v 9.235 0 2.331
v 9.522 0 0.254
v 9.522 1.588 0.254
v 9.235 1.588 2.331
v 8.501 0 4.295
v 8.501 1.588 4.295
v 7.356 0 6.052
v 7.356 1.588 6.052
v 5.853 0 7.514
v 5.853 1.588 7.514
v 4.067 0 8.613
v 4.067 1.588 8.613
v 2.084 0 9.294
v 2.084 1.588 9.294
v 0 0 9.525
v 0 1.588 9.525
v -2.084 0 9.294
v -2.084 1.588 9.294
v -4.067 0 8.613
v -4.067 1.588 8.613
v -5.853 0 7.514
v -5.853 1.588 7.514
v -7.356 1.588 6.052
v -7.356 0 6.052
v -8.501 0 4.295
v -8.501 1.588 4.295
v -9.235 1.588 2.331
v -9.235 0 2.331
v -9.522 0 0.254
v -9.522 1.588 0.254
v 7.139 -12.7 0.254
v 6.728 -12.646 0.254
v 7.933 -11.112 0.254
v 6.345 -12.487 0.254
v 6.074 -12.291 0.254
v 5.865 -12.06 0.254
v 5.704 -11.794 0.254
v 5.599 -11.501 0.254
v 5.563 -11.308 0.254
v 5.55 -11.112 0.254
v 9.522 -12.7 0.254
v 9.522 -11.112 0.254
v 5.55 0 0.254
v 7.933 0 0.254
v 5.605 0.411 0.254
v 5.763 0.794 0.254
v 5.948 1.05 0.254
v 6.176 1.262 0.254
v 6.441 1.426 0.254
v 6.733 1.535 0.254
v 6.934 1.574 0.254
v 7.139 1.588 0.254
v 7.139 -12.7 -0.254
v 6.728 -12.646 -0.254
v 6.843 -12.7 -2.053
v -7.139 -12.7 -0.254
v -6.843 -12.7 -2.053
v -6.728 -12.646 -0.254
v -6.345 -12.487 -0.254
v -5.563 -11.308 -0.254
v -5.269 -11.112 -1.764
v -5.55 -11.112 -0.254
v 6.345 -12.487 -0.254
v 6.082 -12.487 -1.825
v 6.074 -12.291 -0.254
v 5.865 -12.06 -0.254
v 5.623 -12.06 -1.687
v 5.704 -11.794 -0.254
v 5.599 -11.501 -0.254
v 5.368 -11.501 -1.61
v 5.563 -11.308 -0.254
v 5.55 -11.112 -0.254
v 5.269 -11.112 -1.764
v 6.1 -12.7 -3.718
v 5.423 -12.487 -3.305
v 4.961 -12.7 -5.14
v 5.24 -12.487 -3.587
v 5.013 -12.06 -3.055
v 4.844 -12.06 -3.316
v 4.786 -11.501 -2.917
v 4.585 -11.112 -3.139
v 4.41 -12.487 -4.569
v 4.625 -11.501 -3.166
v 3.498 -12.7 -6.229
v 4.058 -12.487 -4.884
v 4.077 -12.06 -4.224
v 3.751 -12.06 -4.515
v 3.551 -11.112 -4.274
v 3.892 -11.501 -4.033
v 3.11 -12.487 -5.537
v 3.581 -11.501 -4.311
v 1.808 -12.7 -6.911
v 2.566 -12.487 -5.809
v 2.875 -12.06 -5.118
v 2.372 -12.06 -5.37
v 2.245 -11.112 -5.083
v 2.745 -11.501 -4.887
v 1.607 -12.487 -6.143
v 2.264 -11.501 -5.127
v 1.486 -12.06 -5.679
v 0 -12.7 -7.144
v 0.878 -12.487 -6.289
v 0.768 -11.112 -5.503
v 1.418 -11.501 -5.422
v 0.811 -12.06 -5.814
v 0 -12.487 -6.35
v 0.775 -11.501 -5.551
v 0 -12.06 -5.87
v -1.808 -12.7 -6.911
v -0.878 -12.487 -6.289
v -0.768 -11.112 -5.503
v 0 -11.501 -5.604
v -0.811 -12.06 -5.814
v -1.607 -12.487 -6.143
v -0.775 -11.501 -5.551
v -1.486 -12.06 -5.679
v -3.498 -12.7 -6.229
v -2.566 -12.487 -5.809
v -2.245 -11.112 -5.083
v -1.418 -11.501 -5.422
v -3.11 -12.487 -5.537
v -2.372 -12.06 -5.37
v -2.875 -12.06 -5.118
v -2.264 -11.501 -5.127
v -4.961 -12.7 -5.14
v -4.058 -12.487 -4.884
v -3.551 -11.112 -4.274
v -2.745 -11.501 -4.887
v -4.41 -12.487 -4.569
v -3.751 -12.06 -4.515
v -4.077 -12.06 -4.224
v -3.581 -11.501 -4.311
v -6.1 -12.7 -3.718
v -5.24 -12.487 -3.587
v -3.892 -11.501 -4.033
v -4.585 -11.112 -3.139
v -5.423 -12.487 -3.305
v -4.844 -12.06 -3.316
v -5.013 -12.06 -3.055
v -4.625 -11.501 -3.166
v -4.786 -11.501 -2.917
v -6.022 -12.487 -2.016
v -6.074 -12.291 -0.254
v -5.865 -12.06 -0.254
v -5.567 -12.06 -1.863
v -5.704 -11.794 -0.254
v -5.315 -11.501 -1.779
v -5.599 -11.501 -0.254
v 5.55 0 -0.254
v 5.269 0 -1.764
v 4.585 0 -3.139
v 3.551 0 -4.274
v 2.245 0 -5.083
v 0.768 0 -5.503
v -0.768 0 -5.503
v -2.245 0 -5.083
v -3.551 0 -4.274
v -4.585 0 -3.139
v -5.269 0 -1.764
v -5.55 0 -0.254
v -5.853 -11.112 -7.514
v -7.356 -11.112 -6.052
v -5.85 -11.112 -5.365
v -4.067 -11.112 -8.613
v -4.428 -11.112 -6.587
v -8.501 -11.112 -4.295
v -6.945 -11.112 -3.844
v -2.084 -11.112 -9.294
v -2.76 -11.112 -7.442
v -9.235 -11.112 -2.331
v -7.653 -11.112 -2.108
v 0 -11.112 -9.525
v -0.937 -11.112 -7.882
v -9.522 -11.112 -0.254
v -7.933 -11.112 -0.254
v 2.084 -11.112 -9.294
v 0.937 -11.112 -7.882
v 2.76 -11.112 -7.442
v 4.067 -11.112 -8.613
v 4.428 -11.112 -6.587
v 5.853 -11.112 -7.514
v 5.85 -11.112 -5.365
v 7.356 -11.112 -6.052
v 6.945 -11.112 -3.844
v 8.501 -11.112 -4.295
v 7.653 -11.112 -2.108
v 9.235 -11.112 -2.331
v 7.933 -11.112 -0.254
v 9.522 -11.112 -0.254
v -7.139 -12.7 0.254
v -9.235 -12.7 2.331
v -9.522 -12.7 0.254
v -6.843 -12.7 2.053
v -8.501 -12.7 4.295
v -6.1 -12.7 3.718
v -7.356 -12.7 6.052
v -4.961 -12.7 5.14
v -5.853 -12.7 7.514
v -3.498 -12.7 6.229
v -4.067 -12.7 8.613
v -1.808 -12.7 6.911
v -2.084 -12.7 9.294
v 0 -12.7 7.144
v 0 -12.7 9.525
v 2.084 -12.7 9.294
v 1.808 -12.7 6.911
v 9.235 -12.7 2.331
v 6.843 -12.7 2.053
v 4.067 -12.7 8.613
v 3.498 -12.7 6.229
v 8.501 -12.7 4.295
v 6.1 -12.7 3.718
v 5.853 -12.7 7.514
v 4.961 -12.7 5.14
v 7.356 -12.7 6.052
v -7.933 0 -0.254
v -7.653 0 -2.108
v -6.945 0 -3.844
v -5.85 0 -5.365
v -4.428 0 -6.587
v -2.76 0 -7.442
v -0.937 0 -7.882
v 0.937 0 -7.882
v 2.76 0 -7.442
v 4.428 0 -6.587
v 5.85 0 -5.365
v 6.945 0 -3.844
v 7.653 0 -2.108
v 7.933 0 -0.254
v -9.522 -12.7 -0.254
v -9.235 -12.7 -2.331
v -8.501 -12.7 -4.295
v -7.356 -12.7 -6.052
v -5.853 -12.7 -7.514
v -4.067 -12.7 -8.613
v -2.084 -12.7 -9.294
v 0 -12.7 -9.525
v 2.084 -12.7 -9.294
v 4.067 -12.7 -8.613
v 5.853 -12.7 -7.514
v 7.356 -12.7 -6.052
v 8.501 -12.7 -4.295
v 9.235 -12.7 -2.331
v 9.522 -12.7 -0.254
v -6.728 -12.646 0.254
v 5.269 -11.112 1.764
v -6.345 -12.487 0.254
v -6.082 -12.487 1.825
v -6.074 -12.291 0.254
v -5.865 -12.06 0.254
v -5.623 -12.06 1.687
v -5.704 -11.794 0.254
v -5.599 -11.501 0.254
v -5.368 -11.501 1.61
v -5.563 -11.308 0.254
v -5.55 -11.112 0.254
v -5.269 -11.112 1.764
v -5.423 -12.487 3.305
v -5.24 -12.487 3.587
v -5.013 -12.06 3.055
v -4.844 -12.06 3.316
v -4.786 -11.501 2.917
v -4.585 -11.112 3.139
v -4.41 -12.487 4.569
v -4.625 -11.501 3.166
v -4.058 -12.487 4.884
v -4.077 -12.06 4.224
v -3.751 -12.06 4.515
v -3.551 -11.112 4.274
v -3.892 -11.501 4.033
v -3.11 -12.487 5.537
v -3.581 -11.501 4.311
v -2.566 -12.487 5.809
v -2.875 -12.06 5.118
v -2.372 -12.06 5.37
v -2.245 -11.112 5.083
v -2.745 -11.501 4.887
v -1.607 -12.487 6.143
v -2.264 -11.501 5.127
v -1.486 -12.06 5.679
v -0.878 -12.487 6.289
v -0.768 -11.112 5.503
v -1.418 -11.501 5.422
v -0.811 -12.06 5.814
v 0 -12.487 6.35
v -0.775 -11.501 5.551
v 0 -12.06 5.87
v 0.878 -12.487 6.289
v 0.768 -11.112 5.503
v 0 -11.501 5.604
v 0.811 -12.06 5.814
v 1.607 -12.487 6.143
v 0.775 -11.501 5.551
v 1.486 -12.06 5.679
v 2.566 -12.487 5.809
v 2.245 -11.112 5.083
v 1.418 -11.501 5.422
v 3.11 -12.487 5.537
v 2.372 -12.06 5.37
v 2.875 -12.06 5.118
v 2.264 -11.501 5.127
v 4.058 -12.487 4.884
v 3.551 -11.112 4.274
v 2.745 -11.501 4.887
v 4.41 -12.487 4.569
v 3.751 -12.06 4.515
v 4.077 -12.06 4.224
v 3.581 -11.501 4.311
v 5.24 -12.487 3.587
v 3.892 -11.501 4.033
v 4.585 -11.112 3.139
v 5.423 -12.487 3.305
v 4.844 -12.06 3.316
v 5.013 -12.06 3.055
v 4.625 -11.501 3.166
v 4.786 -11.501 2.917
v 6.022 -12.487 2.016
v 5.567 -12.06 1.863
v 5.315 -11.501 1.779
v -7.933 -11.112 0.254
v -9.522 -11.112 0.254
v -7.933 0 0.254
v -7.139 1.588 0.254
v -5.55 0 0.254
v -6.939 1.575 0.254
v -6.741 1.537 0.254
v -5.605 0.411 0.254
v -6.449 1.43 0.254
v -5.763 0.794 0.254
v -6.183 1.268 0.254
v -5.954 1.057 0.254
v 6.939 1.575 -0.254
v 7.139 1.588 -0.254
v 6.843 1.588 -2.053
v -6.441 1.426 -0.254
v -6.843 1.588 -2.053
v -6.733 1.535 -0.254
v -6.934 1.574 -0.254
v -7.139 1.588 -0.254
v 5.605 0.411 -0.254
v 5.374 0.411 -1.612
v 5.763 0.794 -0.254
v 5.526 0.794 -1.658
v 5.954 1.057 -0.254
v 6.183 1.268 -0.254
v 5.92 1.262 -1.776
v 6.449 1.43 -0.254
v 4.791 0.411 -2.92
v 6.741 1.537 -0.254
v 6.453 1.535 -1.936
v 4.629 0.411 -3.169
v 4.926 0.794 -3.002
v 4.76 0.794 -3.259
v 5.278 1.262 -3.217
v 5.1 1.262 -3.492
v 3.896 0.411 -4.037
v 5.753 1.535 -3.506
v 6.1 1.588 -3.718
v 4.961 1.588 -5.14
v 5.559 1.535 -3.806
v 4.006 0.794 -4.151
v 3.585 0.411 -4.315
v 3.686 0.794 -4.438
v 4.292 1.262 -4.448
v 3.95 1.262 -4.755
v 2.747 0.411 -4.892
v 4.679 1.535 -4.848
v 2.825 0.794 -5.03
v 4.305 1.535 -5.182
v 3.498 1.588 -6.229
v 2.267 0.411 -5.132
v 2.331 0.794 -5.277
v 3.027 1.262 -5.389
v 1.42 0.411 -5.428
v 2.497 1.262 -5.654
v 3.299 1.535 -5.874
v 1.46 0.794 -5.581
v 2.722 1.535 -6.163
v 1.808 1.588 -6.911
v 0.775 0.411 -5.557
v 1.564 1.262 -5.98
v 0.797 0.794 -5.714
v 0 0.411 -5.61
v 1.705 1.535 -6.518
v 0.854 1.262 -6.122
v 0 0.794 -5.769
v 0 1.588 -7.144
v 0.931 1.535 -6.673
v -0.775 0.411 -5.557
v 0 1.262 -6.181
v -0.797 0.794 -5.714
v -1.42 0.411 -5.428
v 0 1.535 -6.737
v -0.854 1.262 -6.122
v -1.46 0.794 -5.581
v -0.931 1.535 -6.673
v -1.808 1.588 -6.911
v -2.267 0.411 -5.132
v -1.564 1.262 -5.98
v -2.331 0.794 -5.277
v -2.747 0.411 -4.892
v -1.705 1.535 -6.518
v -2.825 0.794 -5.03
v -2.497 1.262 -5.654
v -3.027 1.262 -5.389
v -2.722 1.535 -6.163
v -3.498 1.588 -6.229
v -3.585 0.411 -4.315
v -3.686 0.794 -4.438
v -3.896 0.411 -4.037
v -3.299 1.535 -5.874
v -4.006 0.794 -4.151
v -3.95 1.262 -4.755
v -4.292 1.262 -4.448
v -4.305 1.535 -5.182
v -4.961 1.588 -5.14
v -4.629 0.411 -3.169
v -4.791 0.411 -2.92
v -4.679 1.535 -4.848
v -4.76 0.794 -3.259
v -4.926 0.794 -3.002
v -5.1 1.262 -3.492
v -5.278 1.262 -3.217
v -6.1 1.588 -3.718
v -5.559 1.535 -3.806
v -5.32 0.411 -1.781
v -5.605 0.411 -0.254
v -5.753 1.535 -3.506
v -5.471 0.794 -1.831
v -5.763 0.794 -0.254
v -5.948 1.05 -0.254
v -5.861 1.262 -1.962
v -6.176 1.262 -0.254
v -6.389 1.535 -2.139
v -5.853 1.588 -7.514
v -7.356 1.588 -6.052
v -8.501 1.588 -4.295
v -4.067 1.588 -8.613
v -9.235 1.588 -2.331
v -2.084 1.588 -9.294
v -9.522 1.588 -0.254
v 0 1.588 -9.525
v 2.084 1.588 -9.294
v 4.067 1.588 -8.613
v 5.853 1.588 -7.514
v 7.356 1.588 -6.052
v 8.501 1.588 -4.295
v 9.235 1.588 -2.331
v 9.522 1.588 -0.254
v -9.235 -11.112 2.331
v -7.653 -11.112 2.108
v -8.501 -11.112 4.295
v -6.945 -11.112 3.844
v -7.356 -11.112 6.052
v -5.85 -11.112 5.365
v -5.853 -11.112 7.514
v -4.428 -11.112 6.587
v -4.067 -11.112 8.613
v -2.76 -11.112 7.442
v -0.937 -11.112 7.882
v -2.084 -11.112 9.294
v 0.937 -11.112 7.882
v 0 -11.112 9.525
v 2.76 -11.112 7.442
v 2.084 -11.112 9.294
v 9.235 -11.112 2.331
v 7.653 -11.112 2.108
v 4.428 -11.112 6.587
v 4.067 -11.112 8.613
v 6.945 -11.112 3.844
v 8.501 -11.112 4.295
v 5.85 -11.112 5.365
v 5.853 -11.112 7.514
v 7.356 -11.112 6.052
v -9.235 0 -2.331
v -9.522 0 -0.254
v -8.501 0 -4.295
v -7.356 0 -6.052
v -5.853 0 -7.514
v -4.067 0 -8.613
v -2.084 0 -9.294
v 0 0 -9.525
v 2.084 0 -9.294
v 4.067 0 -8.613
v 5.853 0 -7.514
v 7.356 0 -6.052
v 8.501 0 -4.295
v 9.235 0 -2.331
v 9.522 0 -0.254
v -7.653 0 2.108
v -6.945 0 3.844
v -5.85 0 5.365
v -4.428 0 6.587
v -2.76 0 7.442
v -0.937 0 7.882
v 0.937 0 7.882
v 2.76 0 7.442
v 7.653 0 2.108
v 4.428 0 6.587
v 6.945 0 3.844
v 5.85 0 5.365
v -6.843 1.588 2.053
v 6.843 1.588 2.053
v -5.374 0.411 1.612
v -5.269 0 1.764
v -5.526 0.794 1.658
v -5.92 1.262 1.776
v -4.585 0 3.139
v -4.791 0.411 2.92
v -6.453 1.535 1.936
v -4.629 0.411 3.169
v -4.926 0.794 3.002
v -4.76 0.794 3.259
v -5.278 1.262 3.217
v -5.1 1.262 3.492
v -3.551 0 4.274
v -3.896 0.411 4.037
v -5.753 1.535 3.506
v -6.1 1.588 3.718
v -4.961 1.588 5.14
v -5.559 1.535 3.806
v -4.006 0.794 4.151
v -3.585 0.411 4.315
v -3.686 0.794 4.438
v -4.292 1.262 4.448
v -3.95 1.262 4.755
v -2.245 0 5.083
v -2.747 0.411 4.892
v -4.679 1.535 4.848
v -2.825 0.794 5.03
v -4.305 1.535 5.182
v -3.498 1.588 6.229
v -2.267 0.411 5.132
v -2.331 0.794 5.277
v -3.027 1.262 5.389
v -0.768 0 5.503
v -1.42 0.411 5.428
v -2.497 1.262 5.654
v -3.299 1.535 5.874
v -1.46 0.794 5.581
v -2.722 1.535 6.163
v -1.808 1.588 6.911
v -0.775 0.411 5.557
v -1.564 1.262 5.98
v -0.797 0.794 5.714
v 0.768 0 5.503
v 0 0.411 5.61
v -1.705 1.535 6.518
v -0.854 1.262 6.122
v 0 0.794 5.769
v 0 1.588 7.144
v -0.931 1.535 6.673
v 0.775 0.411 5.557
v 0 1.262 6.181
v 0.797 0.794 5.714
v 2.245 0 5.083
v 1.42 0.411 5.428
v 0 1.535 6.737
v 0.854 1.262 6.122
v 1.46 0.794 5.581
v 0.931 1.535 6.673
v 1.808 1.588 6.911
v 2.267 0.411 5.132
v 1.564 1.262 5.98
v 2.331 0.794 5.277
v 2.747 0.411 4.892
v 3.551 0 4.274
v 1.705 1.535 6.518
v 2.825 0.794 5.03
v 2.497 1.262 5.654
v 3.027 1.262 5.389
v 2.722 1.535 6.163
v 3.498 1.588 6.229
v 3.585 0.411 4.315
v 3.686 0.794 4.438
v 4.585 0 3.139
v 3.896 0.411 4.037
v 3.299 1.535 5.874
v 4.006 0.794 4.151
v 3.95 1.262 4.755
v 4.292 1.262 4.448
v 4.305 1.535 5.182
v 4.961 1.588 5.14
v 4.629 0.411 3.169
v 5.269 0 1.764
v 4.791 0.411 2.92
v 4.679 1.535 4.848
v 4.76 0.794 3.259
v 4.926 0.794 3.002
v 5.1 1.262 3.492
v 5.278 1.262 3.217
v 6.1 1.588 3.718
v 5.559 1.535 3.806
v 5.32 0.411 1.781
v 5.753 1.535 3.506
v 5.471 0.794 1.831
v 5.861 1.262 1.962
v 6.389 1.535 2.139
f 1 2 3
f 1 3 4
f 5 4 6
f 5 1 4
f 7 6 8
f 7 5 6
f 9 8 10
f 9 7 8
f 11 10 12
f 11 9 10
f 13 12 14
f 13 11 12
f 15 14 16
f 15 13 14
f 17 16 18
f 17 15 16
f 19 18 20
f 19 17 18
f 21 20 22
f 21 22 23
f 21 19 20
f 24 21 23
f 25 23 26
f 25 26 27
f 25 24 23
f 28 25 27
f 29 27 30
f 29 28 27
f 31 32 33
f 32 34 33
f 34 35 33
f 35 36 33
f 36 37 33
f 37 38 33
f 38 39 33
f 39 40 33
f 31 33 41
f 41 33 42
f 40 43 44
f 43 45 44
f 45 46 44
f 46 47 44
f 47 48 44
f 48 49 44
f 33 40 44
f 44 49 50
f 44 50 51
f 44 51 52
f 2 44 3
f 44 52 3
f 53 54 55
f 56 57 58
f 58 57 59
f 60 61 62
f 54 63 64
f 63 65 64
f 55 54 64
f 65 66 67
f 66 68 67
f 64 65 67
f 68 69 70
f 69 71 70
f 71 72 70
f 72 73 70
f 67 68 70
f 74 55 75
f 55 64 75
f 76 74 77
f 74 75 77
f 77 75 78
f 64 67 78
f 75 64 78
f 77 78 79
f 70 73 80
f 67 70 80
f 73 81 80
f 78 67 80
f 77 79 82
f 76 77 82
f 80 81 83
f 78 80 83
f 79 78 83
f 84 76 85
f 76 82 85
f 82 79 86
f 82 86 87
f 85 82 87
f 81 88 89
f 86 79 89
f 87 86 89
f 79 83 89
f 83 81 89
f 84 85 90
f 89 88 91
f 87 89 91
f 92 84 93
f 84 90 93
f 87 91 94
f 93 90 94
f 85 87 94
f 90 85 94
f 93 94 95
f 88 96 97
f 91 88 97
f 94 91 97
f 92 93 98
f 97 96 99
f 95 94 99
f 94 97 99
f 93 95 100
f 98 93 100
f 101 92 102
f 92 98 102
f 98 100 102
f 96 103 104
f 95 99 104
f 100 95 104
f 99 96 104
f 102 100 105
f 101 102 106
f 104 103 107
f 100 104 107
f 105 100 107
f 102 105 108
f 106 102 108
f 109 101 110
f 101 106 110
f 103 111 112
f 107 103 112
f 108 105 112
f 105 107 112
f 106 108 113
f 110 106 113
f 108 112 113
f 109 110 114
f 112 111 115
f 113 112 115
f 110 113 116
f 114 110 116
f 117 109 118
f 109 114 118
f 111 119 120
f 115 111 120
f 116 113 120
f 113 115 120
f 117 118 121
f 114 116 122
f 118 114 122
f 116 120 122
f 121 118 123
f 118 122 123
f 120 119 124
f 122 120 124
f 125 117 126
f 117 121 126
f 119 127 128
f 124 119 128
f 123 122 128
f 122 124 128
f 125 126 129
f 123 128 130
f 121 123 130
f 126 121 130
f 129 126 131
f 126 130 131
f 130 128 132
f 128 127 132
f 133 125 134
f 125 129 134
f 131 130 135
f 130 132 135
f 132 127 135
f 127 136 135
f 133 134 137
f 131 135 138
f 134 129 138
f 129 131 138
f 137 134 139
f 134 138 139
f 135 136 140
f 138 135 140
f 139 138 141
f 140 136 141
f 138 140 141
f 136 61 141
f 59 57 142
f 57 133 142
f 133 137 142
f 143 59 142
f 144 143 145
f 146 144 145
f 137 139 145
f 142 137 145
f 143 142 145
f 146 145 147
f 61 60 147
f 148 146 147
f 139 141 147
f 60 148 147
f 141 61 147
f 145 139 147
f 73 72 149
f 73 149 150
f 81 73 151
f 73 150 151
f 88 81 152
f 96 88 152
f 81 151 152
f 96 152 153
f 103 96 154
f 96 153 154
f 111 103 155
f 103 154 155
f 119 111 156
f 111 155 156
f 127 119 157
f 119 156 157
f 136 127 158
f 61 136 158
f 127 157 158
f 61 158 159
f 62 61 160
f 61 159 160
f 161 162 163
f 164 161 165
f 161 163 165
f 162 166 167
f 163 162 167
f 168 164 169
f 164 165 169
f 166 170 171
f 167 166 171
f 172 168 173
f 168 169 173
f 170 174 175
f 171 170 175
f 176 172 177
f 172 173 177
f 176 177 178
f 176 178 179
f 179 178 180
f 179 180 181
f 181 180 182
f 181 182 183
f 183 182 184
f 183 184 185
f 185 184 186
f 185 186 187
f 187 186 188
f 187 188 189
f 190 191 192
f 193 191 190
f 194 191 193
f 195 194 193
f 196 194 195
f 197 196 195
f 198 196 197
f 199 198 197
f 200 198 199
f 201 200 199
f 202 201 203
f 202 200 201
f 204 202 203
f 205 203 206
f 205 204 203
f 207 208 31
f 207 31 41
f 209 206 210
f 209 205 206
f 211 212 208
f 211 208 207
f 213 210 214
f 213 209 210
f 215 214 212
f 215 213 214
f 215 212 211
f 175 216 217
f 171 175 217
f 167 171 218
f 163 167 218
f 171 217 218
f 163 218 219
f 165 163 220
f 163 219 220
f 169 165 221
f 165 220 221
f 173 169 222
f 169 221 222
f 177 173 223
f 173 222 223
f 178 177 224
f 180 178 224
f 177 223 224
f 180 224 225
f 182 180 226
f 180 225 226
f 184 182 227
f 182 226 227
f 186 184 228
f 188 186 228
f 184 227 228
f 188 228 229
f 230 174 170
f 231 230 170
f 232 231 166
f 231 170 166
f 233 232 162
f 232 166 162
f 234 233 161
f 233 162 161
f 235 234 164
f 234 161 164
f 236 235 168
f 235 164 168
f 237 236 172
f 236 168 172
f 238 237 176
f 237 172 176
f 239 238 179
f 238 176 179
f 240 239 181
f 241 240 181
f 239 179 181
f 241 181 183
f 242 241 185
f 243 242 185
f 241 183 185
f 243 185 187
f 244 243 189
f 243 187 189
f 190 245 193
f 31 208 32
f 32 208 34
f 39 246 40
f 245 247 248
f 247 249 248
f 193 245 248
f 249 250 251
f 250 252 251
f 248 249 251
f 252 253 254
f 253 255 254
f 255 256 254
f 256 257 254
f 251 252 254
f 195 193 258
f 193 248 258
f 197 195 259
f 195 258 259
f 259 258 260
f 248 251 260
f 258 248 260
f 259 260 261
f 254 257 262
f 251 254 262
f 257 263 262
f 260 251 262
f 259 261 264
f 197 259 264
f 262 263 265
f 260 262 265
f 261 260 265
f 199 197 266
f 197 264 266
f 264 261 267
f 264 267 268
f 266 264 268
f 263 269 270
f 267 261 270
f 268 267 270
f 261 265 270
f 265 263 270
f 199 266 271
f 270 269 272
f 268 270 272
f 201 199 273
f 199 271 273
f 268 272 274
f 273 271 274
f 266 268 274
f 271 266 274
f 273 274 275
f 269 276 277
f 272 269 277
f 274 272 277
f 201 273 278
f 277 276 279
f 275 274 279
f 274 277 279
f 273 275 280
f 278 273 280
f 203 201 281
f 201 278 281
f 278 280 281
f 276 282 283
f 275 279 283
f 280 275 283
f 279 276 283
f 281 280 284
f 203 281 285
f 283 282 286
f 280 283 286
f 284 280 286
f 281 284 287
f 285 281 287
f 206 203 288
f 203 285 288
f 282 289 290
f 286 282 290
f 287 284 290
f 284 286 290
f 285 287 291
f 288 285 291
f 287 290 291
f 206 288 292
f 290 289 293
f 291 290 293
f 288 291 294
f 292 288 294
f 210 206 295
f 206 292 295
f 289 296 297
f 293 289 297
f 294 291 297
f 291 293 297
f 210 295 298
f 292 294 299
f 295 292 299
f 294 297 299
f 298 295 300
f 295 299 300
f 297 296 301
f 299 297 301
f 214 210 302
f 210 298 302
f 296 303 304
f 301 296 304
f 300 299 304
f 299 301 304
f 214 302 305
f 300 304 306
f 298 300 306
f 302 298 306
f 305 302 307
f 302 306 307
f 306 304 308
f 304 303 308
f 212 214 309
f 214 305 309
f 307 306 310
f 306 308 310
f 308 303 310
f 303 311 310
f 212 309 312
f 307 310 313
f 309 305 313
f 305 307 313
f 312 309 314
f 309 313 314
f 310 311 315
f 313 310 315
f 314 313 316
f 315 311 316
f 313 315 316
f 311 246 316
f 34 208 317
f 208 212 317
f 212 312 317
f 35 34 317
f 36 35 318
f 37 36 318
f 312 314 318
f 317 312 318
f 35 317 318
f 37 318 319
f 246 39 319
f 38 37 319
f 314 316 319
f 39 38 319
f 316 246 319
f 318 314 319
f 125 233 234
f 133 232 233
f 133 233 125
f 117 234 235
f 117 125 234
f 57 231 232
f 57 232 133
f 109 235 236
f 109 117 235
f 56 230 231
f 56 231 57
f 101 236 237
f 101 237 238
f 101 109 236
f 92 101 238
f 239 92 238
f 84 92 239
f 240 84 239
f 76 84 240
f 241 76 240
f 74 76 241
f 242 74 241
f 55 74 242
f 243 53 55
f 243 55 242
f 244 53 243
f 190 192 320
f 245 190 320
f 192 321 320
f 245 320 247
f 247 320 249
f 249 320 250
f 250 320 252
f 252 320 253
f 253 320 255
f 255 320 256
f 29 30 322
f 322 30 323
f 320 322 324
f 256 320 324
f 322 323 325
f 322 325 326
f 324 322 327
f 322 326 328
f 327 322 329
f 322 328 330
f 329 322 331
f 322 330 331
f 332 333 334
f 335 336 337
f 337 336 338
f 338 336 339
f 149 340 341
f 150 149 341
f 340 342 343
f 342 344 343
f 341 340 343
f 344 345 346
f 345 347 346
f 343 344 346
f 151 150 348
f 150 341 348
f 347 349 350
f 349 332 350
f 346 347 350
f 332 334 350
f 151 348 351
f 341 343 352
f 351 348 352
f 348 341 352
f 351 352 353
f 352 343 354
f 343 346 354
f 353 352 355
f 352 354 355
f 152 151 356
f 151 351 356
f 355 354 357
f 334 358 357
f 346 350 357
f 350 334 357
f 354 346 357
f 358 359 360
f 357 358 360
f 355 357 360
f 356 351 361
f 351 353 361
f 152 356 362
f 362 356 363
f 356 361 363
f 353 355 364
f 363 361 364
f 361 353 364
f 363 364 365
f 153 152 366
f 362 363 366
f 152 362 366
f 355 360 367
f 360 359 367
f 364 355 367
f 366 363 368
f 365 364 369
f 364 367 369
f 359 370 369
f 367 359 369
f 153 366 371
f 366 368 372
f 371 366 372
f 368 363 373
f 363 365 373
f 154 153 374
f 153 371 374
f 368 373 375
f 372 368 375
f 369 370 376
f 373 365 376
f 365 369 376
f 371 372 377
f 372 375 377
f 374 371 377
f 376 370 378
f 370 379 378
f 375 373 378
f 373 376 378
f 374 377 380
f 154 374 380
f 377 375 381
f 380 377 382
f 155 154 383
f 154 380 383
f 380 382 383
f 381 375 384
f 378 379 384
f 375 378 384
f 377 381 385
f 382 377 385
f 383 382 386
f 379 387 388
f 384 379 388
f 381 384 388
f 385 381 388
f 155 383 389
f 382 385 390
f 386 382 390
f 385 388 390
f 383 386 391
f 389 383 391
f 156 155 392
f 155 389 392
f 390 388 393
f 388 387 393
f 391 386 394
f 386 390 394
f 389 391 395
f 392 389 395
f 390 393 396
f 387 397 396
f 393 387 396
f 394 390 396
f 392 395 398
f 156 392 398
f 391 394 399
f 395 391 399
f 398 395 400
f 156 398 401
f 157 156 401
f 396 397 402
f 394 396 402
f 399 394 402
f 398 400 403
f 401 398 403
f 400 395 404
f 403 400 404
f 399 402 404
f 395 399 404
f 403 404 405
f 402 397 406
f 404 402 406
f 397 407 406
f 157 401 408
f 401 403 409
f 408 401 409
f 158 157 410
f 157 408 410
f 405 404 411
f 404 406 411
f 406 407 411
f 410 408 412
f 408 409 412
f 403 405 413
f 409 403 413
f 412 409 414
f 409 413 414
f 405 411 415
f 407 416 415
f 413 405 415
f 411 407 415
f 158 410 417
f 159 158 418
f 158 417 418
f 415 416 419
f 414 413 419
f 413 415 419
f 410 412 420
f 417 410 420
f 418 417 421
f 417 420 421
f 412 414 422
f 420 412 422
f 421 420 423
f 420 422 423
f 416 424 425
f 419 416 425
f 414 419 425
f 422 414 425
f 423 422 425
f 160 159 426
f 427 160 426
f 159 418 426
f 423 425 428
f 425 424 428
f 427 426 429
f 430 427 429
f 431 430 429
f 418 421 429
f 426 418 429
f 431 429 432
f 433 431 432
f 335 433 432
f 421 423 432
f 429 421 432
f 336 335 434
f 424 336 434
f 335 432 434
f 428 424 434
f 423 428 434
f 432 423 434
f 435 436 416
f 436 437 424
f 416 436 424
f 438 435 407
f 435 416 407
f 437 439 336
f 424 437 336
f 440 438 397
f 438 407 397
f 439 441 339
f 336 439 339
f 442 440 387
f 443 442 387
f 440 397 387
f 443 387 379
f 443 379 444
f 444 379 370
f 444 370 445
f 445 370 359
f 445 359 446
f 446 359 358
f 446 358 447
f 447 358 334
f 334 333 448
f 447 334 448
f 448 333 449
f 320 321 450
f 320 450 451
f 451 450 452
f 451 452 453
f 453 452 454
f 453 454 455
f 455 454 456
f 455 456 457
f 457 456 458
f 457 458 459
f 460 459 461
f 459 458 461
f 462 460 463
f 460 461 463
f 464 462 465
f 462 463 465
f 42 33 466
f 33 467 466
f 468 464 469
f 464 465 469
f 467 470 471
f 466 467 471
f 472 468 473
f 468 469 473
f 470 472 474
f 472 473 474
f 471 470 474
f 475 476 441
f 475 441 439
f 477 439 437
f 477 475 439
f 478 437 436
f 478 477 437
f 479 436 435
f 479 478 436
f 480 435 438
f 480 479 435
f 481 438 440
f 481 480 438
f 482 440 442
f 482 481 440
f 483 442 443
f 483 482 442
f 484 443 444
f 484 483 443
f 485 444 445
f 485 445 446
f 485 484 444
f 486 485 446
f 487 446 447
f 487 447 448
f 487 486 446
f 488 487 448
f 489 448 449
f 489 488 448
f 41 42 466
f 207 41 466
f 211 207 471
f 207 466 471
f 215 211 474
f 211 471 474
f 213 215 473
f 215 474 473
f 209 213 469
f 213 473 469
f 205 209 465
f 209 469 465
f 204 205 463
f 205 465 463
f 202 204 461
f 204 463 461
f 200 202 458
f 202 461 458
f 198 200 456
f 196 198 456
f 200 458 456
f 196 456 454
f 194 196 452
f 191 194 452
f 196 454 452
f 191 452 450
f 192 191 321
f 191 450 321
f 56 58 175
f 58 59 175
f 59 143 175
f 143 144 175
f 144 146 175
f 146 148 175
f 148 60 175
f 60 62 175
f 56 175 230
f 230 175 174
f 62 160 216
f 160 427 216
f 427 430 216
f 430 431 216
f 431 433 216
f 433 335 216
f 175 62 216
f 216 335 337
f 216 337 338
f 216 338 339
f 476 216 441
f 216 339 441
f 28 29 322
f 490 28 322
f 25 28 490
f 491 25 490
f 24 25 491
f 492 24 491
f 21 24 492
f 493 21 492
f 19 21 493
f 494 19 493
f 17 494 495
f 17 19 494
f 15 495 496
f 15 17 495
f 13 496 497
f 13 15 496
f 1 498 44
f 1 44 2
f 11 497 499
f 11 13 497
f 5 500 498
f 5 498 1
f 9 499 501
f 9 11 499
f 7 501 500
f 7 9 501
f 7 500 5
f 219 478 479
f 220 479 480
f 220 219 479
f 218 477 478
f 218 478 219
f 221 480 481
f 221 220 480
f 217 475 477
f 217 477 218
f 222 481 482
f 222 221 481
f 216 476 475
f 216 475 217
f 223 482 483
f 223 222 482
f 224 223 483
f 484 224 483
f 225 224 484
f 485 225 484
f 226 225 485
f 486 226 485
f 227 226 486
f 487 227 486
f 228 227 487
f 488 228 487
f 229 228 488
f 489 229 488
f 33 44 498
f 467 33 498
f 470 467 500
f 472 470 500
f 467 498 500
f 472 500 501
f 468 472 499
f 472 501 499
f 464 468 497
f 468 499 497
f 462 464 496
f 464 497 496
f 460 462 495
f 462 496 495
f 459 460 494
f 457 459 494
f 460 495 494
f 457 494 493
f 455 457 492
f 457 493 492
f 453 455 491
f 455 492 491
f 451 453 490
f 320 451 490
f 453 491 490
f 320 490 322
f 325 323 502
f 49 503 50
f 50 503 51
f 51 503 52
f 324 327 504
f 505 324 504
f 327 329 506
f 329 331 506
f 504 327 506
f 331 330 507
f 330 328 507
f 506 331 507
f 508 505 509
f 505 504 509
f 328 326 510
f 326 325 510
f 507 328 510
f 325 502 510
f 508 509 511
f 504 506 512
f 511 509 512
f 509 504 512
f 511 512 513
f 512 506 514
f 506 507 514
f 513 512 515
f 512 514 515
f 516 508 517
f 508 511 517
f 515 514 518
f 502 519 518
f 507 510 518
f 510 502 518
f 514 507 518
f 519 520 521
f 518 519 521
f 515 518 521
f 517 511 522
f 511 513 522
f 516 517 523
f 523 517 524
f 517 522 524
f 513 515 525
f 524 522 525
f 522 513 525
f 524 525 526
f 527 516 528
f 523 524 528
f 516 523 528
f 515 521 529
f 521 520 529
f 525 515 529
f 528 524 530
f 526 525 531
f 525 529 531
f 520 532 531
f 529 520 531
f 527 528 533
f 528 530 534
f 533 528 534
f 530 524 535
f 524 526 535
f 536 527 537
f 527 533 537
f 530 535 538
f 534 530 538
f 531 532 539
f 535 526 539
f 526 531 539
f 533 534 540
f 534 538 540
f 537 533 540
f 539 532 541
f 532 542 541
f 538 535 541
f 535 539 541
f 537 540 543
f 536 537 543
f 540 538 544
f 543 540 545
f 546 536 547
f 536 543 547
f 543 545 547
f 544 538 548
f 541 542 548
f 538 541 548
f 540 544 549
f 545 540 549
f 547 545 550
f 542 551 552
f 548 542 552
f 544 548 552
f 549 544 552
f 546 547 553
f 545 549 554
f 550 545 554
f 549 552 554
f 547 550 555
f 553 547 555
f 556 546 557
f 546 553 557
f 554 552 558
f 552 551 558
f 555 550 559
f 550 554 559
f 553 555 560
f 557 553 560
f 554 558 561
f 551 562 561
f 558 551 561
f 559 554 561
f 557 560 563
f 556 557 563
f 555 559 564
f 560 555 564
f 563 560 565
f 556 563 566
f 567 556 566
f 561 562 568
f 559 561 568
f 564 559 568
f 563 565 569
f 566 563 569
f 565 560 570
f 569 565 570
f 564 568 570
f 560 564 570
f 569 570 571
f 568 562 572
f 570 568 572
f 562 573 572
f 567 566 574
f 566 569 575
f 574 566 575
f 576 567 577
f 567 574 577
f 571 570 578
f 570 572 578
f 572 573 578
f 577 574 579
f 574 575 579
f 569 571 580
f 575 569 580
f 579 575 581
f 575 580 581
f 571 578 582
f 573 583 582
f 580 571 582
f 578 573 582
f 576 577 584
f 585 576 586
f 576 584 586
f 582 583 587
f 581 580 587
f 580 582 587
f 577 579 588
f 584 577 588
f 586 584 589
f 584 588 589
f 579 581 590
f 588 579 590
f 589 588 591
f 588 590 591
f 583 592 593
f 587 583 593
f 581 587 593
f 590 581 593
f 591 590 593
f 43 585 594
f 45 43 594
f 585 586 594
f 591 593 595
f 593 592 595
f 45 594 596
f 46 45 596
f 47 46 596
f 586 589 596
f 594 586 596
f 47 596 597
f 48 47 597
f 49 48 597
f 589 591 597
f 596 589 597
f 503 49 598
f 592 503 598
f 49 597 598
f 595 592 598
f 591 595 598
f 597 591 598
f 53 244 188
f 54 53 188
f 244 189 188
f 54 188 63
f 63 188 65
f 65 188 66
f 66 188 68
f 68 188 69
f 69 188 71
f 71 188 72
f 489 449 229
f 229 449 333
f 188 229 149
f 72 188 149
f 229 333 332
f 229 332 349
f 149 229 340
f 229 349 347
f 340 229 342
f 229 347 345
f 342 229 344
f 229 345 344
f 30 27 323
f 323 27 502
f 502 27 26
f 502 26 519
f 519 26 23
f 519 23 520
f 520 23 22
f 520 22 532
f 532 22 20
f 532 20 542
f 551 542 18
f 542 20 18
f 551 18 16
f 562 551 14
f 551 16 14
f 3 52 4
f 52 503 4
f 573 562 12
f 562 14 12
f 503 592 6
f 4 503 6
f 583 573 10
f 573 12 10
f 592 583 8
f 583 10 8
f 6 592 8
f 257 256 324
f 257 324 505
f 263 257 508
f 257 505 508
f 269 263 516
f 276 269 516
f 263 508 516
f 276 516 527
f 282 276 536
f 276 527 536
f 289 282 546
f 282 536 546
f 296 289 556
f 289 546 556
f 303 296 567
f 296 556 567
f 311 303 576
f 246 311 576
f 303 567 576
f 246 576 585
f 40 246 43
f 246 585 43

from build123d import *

# Parameters (mm, degrees)
F1_DEPTH = 11.1125
F2_DEPTH = 1.5875
F3_START = 11.1125
F3_DEPTH = 1.5875
F4_R     = 1.5875
F4_2_R   = 1.5875


with BuildPart() as f1:
    # F0 (on Front) → F1 (new body)
    with BuildSketch(Plane.XZ):
        with BuildLine():
            Line((5.5504412494, 0.254), (7.9334349591, 0.254))
            ThreePointArc((7.9334349591, 0.254), (0, 7.9375), (-7.9334349591, 0.254))
            Line((-7.9334349591, 0.254), (-5.5504412494, 0.254))
            ThreePointArc((-5.5504412494, 0.254), (0, 5.55625), (5.5504412494, 0.254))
        make_face()
    extrude(amount=F1_DEPTH)

    # F0 (on Front) → F2, piece 2 (join)
    with BuildSketch(Plane.XZ):
        with BuildLine():
            Line((5.5504412494, 0.254), (7.9334349591, 0.254))
            ThreePointArc((7.9334349591, 0.254), (0, 7.9375), (-7.9334349591, 0.254))
            Line((-7.9334349591, 0.254), (-5.5504412494, 0.254))
            ThreePointArc((-5.5504412494, 0.254), (0, 5.55625), (5.5504412494, 0.254))
        make_face()
        with BuildLine():
            Line((7.9334349591, 0.254), (9.521612731, 0.254))
            ThreePointArc((9.521612731, 0.254), (0, 9.525), (-9.521612731, 0.254))
            Line((-9.521612731, 0.254), (-7.9334349591, 0.254))
            ThreePointArc((-7.9334349591, 0.254), (0, 7.9375), (7.9334349591, 0.254))
        make_face()
    extrude(amount=-F2_DEPTH)

    # F0 (on Front) → F3 (join)
    with BuildSketch(Plane.XZ.offset(F3_START)):
        with BuildLine():
            Line((7.9334349591, 0.254), (9.521612731, 0.254))
            ThreePointArc((9.521612731, 0.254), (0, 9.525), (-9.521612731, 0.254))
            Line((-9.521612731, 0.254), (-7.9334349591, 0.254))
            ThreePointArc((-7.9334349591, 0.254), (0, 7.9375), (7.9334349591, 0.254))
        make_face()
        with BuildLine():
            Line((5.5504412494, 0.254), (7.9334349591, 0.254))
            ThreePointArc((7.9334349591, 0.254), (0, 7.9375), (-7.9334349591, 0.254))
            Line((-7.9334349591, 0.254), (-5.5504412494, 0.254))
            ThreePointArc((-5.5504412494, 0.254), (0, 5.55625), (5.5504412494, 0.254))
        make_face()
    extrude(amount=F3_DEPTH)

    # F4
    f4_edges = [f1.edges().sort_by_distance(p)[0] for p in [
        (0, 1.5875, 5.55625),
        (0, -12.7, 5.55625),
    ]]
    fillet(f4_edges, radius=F4_R)


with BuildPart() as f1b:
    # F0 (on Front) → F1, piece 2 (new body)
    with BuildSketch(Plane.XZ):
        with BuildLine():
            Line((-5.5504412494, -0.254), (-7.9334349591, -0.254))
            ThreePointArc((-7.9334349591, -0.254), (0, -7.9375), (7.9334349591, -0.254))
            Line((7.9334349591, -0.254), (5.5504412494, -0.254))
            ThreePointArc((5.5504412494, -0.254), (0, -5.55625), (-5.5504412494, -0.254))
        make_face()
    extrude(amount=F1_DEPTH)

    # F0 (on Front) → F2 (join)
    with BuildSketch(Plane.XZ):
        with BuildLine():
            Line((-5.5504412494, -0.254), (-7.9334349591, -0.254))
            ThreePointArc((-7.9334349591, -0.254), (0, -7.9375), (7.9334349591, -0.254))
            Line((7.9334349591, -0.254), (5.5504412494, -0.254))
            ThreePointArc((5.5504412494, -0.254), (0, -5.55625), (-5.5504412494, -0.254))
        make_face()
        with BuildLine():
            Line((-7.9334349591, -0.254), (-9.521612731, -0.254))
            ThreePointArc((-9.521612731, -0.254), (0, -9.525), (9.521612731, -0.254))
            Line((9.521612731, -0.254), (7.9334349591, -0.254))
            ThreePointArc((7.9334349591, -0.254), (0, -7.9375), (-7.9334349591, -0.254))
        make_face()
    extrude(amount=-F2_DEPTH)

    # F0 (on Front) → F3, piece 2 (join)
    with BuildSketch(Plane.XZ.offset(F3_START)):
        with BuildLine():
            Line((-7.9334349591, -0.254), (-9.521612731, -0.254))
            ThreePointArc((-9.521612731, -0.254), (0, -9.525), (9.521612731, -0.254))
            Line((9.521612731, -0.254), (7.9334349591, -0.254))
            ThreePointArc((7.9334349591, -0.254), (0, -7.9375), (-7.9334349591, -0.254))
        make_face()
        with BuildLine():
            Line((-5.5504412494, -0.254), (-7.9334349591, -0.254))
            ThreePointArc((-7.9334349591, -0.254), (0, -7.9375), (7.9334349591, -0.254))
            Line((7.9334349591, -0.254), (5.5504412494, -0.254))
            ThreePointArc((5.5504412494, -0.254), (0, -5.55625), (-5.5504412494, -0.254))
        make_face()
    extrude(amount=F3_DEPTH)

    # F4#2
    f4_2_edges = [f1b.edges().sort_by_distance(p)[0] for p in [
        (0, 1.5875, -5.55625),
        (0, -12.7, -5.55625),
    ]]
    fillet(f4_2_edges, radius=F4_2_R)


solid = Compound([f1.part, f1b.part])
